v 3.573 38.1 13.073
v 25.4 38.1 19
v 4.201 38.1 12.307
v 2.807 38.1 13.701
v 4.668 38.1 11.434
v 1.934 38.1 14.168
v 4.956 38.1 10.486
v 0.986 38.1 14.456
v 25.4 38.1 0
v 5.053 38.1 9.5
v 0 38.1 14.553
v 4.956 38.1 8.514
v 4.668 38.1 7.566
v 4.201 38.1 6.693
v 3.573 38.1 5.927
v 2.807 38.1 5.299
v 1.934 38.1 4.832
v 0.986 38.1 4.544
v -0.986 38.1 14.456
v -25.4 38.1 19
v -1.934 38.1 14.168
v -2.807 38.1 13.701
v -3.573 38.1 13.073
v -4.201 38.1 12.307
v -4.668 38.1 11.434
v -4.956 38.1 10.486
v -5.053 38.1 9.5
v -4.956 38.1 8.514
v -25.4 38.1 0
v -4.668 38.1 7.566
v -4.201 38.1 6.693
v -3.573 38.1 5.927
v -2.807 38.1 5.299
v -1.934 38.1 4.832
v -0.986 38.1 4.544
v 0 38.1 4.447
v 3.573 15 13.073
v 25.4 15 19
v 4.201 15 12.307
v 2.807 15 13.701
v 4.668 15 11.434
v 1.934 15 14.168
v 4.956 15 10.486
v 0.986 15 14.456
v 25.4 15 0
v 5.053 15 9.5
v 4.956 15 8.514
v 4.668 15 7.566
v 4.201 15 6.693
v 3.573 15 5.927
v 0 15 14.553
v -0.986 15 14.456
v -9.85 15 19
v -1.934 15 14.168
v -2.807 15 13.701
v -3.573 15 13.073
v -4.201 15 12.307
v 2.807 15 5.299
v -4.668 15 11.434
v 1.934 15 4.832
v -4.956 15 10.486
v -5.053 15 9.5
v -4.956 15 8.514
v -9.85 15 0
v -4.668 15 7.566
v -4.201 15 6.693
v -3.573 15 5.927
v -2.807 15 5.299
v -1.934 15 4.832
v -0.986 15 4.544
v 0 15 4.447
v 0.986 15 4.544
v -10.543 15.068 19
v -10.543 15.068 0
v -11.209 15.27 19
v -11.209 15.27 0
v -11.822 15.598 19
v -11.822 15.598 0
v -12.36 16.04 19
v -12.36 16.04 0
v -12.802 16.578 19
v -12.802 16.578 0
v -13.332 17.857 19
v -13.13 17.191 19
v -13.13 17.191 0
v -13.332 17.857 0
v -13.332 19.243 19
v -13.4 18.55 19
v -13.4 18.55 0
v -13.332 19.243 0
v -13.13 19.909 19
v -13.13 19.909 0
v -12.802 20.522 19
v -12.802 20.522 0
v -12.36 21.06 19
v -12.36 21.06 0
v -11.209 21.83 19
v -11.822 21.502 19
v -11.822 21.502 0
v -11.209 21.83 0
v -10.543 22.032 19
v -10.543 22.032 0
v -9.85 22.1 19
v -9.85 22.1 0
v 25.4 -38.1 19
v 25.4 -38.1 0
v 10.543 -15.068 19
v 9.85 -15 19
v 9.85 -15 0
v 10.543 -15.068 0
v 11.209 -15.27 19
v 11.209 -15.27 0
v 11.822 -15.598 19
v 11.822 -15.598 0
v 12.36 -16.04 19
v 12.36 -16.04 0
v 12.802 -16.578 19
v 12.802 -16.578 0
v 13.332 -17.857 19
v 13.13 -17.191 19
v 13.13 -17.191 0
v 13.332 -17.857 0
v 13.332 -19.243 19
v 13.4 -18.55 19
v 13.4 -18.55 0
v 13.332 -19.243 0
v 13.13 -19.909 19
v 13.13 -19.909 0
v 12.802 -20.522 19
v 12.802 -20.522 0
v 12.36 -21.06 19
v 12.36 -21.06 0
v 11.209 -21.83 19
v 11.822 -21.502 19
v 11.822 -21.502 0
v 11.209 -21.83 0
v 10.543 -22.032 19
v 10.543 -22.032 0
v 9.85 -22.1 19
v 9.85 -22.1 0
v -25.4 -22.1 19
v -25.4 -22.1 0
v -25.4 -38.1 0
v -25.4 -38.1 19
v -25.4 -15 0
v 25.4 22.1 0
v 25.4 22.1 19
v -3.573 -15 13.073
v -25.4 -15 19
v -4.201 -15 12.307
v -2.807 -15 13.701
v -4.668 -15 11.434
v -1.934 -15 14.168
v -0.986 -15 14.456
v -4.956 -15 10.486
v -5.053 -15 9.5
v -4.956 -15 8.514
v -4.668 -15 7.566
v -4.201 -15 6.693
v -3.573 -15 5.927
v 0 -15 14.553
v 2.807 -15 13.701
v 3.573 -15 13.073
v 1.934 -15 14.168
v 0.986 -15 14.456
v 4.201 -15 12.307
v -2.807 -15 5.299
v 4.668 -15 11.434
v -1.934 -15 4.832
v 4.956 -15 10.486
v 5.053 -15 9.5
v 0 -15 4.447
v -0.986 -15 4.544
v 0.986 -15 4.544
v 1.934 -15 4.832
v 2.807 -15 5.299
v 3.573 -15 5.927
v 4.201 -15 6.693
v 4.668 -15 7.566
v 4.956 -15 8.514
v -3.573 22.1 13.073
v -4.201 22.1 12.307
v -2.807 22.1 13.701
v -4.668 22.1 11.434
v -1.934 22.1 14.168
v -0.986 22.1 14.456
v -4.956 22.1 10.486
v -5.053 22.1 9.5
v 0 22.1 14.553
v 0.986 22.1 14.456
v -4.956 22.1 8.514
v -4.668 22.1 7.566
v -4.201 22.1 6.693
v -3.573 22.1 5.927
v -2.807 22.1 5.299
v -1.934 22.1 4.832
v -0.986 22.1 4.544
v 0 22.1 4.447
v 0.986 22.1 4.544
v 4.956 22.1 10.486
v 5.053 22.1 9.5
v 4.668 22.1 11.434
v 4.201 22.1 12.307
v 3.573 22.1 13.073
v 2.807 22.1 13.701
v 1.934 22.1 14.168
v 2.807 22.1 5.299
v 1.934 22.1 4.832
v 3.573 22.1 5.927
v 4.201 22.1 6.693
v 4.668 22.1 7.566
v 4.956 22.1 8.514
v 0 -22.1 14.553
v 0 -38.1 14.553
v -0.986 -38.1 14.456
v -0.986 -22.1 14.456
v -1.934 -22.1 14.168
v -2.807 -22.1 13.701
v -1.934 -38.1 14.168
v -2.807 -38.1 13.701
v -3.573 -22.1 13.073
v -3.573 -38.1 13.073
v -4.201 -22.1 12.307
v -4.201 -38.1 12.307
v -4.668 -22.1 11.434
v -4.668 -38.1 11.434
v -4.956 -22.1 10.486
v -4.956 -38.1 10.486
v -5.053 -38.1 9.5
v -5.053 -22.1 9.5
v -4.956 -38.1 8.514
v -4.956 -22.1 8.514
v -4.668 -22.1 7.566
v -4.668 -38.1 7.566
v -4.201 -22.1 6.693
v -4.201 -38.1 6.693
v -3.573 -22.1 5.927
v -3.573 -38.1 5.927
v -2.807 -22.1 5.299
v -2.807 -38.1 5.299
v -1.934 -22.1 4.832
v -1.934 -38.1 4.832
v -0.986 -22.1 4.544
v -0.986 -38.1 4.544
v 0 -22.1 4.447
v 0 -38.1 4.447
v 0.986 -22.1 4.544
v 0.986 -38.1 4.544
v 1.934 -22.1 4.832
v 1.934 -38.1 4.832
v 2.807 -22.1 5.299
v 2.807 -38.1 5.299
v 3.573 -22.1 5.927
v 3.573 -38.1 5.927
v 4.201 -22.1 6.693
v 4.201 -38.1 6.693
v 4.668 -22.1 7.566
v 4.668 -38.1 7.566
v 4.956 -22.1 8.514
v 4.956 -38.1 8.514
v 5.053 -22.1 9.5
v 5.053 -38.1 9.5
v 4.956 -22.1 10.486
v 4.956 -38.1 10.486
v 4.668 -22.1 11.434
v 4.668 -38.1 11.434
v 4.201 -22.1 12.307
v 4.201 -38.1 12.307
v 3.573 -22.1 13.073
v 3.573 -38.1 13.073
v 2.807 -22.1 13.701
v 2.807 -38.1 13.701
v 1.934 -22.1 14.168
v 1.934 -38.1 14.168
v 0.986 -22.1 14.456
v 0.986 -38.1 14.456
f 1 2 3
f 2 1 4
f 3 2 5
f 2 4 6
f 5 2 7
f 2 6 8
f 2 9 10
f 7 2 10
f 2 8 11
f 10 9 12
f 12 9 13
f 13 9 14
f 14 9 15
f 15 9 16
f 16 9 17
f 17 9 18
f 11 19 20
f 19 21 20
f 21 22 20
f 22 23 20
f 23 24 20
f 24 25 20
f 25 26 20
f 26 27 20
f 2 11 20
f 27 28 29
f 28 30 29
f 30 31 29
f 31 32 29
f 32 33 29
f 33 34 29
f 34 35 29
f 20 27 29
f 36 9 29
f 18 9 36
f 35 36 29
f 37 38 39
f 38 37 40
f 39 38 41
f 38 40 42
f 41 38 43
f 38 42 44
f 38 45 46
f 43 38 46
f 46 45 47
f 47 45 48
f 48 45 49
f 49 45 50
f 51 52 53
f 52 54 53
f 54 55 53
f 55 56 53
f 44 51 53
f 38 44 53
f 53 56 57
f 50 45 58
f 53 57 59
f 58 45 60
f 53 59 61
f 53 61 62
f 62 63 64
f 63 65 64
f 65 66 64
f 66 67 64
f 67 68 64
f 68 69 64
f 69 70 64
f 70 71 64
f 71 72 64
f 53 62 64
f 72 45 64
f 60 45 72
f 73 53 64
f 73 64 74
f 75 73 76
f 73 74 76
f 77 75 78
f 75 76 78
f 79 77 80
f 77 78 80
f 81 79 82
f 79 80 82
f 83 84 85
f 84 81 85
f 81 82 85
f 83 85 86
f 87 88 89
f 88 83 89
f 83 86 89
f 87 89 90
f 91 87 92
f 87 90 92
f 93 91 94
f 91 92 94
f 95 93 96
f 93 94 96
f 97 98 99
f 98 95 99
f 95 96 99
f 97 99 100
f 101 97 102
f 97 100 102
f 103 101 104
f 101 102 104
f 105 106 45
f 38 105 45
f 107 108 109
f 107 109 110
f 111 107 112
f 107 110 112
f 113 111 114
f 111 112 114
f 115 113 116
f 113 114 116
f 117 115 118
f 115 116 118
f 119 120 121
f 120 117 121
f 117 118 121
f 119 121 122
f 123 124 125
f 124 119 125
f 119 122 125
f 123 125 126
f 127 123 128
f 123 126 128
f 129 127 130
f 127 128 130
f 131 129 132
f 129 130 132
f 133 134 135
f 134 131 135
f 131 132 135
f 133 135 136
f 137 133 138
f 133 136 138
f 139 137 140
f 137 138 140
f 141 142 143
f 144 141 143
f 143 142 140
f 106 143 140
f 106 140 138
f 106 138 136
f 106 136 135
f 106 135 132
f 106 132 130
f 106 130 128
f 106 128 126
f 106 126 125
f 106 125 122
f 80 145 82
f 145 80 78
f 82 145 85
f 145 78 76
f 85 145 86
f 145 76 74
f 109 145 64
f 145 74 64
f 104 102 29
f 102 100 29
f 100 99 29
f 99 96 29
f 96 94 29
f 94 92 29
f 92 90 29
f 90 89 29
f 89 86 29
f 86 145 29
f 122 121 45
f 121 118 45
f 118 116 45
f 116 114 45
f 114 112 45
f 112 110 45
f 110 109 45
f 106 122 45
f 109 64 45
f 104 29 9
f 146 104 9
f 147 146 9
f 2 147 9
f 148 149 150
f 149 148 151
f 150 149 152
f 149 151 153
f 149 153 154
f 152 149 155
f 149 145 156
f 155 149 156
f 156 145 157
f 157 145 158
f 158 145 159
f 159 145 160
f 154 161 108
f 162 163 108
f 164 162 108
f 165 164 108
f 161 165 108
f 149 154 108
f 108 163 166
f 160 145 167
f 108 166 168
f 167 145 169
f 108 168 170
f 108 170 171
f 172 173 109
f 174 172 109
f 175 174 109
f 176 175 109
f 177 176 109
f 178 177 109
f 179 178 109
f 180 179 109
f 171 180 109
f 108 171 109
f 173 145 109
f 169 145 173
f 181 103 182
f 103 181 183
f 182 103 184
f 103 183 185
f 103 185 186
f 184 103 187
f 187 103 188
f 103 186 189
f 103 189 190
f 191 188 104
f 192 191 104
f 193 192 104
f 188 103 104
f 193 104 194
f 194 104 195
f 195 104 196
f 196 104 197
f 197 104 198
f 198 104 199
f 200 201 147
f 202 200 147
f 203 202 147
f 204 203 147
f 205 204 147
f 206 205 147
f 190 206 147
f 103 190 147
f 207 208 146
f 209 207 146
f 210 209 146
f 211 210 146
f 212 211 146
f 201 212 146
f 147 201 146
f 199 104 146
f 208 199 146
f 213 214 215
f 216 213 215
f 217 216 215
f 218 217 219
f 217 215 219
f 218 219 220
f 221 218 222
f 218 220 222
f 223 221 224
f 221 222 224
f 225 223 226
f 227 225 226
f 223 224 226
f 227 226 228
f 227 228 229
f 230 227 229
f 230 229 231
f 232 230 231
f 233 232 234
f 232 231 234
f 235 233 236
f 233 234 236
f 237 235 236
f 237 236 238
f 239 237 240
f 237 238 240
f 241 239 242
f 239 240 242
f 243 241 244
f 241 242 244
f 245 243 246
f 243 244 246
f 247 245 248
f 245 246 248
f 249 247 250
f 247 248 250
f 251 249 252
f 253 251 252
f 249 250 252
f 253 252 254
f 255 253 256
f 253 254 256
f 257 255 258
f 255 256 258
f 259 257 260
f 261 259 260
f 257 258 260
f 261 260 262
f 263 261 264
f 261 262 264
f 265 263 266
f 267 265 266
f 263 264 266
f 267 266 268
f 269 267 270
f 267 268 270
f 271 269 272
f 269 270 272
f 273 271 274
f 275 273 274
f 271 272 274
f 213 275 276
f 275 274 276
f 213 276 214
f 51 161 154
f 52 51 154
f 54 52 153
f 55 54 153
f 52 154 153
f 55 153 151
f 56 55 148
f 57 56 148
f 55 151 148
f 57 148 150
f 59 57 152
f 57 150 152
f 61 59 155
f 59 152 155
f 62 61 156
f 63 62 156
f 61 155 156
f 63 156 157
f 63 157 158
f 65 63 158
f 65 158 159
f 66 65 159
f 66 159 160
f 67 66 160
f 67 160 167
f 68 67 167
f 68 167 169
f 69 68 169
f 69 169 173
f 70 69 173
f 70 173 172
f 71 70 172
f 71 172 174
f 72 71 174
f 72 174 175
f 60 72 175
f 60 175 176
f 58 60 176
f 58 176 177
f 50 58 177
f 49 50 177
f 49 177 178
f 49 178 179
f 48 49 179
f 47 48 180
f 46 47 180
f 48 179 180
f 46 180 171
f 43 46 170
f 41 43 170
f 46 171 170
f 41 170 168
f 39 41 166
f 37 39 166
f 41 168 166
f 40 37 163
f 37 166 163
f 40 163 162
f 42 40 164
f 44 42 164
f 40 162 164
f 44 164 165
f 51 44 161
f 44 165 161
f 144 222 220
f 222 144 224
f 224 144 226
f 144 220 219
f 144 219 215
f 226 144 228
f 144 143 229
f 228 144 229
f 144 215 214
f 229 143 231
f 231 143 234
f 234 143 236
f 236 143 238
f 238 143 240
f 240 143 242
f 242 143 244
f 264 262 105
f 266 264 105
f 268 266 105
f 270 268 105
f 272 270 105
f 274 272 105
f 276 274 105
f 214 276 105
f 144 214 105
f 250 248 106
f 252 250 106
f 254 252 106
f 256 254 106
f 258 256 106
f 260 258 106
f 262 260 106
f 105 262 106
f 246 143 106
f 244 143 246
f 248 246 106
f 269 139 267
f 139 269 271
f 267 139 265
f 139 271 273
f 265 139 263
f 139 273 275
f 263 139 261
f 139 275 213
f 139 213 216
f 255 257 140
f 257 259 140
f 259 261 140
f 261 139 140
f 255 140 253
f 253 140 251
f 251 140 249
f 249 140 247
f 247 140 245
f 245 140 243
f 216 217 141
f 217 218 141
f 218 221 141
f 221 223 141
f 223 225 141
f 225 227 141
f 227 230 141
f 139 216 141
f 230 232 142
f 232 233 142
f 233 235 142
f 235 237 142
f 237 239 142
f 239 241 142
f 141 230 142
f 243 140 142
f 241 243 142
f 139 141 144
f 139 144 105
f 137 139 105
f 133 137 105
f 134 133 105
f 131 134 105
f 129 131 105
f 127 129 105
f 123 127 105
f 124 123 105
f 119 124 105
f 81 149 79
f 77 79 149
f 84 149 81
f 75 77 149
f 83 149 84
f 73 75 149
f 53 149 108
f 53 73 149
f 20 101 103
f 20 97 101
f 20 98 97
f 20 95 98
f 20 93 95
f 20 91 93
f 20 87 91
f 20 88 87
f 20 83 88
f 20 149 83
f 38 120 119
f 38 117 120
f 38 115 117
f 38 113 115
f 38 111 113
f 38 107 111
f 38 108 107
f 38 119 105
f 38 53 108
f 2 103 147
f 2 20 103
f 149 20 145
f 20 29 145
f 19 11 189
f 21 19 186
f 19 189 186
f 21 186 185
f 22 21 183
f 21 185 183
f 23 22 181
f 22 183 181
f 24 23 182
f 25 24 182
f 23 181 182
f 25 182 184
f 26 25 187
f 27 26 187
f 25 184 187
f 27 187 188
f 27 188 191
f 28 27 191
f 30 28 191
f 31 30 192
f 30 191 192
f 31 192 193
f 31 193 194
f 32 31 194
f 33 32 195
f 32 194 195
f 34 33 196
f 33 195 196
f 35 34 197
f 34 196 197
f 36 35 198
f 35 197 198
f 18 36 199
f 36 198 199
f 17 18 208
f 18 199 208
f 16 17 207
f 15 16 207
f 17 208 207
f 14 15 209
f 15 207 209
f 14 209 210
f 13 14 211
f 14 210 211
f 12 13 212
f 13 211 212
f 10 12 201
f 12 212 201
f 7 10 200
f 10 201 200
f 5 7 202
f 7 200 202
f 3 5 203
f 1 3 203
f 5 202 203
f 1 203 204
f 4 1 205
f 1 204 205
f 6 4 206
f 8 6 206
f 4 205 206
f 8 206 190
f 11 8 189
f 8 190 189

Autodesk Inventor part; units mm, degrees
ref_plane "YZ Plane" through (0, 0, 0) normal (1, 0, 0) x (0, 1, 0)
ref_plane "XZ Plane" through (0, 0, 0) normal (0, 1, 0) x (-1, 0, 0)
ref_plane "XY Plane" through (0, 0, 0) normal (0, 0, 1) x (1, 0, 0)
sketch "Sketch1" plane through (0, 0, 0) normal (0, 0, 1) x (1, 0, 0)
  line L0 (-25.4, -38.1) -> (25.4, -38.1) construction
  line L1 (25.4, -38.1) -> (25.4, 38.1) construction
  line L2 (25.4, 38.1) -> (-25.4, 38.1) construction
  line L3 (-25.4, 38.1) -> (-25.4, -38.1) construction
  line L4 (-25.4, -38.1) -> (25.4, 38.1) construction
  line L5 (25.4, -38.1) -> (-25.4, 38.1) construction
  line L6 (25.4, 38.1) -> (-25.4, 38.1) construction
  line L7 (-25.4, 38.1) -> (-25.4, 22.1) construction
  line L8 (-25.4, 22.1) -> (25.4, 22.1) construction
  line L9 (25.4, 22.1) -> (25.4, 38.1) construction
  line L10 (-25.4, -38.1) -> (25.4, -38.1) construction
  line L11 (25.4, -38.1) -> (25.4, -22.1) construction
  line L12 (25.4, -22.1) -> (-25.4, -22.1) construction
  line L13 (-25.4, -22.1) -> (-25.4, -38.1) construction
  line L14 (25.4, -15) -> (-25.4, -15) construction
  line L15 (-25.4, -15) -> (-25.4, 15) construction
  line L16 (-25.4, 15) -> (25.4, 15) construction
  line L17 (25.4, 15) -> (25.4, -15) construction
  line L18 (25.4, -15) -> (-25.4, 15) construction
  line L19 (-25.4, -15) -> (25.4, 15) construction
  line L20 (-25.4, 22.1) -> (-13.4, 22.1) construction
  line L21 (-13.4, 22.1) -> (-13.4, 15) construction
  line L22 (-13.4, 15) -> (-25.4, 15) construction
  line L23 (-25.4, 15) -> (-25.4, 22.1) construction
  line L24 (25.4, -22.1) -> (13.4, -22.1) construction
  line L25 (13.4, -22.1) -> (13.4, -15) construction
  line L26 (13.4, -15) -> (25.4, -15) construction
  line L27 (25.4, -15) -> (25.4, -22.1) construction
  line L28 (-13.4, 15) -> (-6.3, 15) construction
  line L29 (-6.3, 15) -> (-6.3, 22.1) construction
  line L30 (-6.3, 22.1) -> (-13.4, 22.1) construction
  line L31 (-13.4, 22.1) -> (-13.4, 15) construction
  line L32 (13.4, -22.1) -> (6.3, -22.1) construction
  line L33 (6.3, -22.1) -> (6.3, -15) construction
  line L34 (6.3, -15) -> (13.4, -15) construction
  line L35 (13.4, -15) -> (13.4, -22.1) construction
  arc A0 (-9.85, 22.1) -> (-9.85, 15) centre (-9.85, 18.55) ccw construction
  arc A1 (9.85, -22.1) -> (9.85, -15) centre (9.85, -18.55) ccw construction
  line L36 (25.4, 22.1) -> (25.4, 38.1)
  line L37 (25.4, 38.1) -> (-25.4, 38.1)
  line L38 (-25.4, 38.1) -> (-25.4, -15)
  line L39 (-25.4, -15) -> (9.85, -15)
  arc A2 (9.85, -22.1) -> (9.85, -15) centre (9.85, -18.55) ccw
  line L40 (9.85, -22.1) -> (-25.4, -22.1)
  line L41 (-25.4, -22.1) -> (-25.4, -38.1)
  line L42 (-25.4, -38.1) -> (25.4, -38.1)
  line L43 (25.4, -38.1) -> (25.4, 15)
  line L44 (25.4, 15) -> (-9.85, 15)
  arc A3 (-9.85, 22.1) -> (-9.85, 15) centre (-9.85, 18.55) ccw
  line L45 (-9.85, 22.1) -> (25.4, 22.1)
  line L46 (25.4, 38.1) -> (25.4, 22.1)
  line L47 (25.4, 22.1) -> (-9.85, 22.1)
  line L48 (-9.85, 15) -> (25.4, 15)
  line L49 (25.4, 15) -> (25.4, -38.1)
  line L50 (25.4, -38.1) -> (-25.4, -38.1)
  line L51 (-25.4, -38.1) -> (-25.4, -22.1)
  line L52 (-25.4, -22.1) -> (9.85, -22.1)
  line L53 (-25.4, -15) -> (9.85, -15)
  arc A4 (9.85, -22.1) -> (9.85, -15) centre (9.85, -18.55) ccw
  arc A5 (-9.85, 22.1) -> (-9.85, 15) centre (-9.85, 18.55) ccw
  line L54 (-25.4, -15) -> (-25.4, 38.1)
  line L55 (-25.4, 38.1) -> (25.4, 38.1)
  point P0 (0, 0)
  dimension "d0" = 50.8
  dimension "d1" = 76.2
  dimension "d2" = 50.8
  dimension "d3" = 16
  dimension "d4" = 16
  dimension "d5" = 30
  dimension "d6" = 12
  dimension "d7" = 12
  dimension "d8" = 7.1
  dimension "d9" = 7.1
extrude "Extrusion1" add sketch "Sketch1" along normal blind 19
sketch "Sketch2" plane through (-25.4, 38.1, 0) normal (0, 1, 0) x (1, 0, 0)
  line L0 (0, -19) -> (50.8, 0) construction
  line L1 (50.8, -19) -> (0, 0) construction
  point P0 (25.4, 0)
  point P1 (25.4, -9.5)
hole "Hole1" at (0, 38.1, 9.5) direction (0, -1, 0) diameter 10.106 end through all thread size "M12x1.75" class "6H" standard "ISO Metric profile"
equation "\"d2\" = d0"
equation "\"d4\" = d3"
properties part number "loadcell_s_500kg" material "Stainless Steel"
